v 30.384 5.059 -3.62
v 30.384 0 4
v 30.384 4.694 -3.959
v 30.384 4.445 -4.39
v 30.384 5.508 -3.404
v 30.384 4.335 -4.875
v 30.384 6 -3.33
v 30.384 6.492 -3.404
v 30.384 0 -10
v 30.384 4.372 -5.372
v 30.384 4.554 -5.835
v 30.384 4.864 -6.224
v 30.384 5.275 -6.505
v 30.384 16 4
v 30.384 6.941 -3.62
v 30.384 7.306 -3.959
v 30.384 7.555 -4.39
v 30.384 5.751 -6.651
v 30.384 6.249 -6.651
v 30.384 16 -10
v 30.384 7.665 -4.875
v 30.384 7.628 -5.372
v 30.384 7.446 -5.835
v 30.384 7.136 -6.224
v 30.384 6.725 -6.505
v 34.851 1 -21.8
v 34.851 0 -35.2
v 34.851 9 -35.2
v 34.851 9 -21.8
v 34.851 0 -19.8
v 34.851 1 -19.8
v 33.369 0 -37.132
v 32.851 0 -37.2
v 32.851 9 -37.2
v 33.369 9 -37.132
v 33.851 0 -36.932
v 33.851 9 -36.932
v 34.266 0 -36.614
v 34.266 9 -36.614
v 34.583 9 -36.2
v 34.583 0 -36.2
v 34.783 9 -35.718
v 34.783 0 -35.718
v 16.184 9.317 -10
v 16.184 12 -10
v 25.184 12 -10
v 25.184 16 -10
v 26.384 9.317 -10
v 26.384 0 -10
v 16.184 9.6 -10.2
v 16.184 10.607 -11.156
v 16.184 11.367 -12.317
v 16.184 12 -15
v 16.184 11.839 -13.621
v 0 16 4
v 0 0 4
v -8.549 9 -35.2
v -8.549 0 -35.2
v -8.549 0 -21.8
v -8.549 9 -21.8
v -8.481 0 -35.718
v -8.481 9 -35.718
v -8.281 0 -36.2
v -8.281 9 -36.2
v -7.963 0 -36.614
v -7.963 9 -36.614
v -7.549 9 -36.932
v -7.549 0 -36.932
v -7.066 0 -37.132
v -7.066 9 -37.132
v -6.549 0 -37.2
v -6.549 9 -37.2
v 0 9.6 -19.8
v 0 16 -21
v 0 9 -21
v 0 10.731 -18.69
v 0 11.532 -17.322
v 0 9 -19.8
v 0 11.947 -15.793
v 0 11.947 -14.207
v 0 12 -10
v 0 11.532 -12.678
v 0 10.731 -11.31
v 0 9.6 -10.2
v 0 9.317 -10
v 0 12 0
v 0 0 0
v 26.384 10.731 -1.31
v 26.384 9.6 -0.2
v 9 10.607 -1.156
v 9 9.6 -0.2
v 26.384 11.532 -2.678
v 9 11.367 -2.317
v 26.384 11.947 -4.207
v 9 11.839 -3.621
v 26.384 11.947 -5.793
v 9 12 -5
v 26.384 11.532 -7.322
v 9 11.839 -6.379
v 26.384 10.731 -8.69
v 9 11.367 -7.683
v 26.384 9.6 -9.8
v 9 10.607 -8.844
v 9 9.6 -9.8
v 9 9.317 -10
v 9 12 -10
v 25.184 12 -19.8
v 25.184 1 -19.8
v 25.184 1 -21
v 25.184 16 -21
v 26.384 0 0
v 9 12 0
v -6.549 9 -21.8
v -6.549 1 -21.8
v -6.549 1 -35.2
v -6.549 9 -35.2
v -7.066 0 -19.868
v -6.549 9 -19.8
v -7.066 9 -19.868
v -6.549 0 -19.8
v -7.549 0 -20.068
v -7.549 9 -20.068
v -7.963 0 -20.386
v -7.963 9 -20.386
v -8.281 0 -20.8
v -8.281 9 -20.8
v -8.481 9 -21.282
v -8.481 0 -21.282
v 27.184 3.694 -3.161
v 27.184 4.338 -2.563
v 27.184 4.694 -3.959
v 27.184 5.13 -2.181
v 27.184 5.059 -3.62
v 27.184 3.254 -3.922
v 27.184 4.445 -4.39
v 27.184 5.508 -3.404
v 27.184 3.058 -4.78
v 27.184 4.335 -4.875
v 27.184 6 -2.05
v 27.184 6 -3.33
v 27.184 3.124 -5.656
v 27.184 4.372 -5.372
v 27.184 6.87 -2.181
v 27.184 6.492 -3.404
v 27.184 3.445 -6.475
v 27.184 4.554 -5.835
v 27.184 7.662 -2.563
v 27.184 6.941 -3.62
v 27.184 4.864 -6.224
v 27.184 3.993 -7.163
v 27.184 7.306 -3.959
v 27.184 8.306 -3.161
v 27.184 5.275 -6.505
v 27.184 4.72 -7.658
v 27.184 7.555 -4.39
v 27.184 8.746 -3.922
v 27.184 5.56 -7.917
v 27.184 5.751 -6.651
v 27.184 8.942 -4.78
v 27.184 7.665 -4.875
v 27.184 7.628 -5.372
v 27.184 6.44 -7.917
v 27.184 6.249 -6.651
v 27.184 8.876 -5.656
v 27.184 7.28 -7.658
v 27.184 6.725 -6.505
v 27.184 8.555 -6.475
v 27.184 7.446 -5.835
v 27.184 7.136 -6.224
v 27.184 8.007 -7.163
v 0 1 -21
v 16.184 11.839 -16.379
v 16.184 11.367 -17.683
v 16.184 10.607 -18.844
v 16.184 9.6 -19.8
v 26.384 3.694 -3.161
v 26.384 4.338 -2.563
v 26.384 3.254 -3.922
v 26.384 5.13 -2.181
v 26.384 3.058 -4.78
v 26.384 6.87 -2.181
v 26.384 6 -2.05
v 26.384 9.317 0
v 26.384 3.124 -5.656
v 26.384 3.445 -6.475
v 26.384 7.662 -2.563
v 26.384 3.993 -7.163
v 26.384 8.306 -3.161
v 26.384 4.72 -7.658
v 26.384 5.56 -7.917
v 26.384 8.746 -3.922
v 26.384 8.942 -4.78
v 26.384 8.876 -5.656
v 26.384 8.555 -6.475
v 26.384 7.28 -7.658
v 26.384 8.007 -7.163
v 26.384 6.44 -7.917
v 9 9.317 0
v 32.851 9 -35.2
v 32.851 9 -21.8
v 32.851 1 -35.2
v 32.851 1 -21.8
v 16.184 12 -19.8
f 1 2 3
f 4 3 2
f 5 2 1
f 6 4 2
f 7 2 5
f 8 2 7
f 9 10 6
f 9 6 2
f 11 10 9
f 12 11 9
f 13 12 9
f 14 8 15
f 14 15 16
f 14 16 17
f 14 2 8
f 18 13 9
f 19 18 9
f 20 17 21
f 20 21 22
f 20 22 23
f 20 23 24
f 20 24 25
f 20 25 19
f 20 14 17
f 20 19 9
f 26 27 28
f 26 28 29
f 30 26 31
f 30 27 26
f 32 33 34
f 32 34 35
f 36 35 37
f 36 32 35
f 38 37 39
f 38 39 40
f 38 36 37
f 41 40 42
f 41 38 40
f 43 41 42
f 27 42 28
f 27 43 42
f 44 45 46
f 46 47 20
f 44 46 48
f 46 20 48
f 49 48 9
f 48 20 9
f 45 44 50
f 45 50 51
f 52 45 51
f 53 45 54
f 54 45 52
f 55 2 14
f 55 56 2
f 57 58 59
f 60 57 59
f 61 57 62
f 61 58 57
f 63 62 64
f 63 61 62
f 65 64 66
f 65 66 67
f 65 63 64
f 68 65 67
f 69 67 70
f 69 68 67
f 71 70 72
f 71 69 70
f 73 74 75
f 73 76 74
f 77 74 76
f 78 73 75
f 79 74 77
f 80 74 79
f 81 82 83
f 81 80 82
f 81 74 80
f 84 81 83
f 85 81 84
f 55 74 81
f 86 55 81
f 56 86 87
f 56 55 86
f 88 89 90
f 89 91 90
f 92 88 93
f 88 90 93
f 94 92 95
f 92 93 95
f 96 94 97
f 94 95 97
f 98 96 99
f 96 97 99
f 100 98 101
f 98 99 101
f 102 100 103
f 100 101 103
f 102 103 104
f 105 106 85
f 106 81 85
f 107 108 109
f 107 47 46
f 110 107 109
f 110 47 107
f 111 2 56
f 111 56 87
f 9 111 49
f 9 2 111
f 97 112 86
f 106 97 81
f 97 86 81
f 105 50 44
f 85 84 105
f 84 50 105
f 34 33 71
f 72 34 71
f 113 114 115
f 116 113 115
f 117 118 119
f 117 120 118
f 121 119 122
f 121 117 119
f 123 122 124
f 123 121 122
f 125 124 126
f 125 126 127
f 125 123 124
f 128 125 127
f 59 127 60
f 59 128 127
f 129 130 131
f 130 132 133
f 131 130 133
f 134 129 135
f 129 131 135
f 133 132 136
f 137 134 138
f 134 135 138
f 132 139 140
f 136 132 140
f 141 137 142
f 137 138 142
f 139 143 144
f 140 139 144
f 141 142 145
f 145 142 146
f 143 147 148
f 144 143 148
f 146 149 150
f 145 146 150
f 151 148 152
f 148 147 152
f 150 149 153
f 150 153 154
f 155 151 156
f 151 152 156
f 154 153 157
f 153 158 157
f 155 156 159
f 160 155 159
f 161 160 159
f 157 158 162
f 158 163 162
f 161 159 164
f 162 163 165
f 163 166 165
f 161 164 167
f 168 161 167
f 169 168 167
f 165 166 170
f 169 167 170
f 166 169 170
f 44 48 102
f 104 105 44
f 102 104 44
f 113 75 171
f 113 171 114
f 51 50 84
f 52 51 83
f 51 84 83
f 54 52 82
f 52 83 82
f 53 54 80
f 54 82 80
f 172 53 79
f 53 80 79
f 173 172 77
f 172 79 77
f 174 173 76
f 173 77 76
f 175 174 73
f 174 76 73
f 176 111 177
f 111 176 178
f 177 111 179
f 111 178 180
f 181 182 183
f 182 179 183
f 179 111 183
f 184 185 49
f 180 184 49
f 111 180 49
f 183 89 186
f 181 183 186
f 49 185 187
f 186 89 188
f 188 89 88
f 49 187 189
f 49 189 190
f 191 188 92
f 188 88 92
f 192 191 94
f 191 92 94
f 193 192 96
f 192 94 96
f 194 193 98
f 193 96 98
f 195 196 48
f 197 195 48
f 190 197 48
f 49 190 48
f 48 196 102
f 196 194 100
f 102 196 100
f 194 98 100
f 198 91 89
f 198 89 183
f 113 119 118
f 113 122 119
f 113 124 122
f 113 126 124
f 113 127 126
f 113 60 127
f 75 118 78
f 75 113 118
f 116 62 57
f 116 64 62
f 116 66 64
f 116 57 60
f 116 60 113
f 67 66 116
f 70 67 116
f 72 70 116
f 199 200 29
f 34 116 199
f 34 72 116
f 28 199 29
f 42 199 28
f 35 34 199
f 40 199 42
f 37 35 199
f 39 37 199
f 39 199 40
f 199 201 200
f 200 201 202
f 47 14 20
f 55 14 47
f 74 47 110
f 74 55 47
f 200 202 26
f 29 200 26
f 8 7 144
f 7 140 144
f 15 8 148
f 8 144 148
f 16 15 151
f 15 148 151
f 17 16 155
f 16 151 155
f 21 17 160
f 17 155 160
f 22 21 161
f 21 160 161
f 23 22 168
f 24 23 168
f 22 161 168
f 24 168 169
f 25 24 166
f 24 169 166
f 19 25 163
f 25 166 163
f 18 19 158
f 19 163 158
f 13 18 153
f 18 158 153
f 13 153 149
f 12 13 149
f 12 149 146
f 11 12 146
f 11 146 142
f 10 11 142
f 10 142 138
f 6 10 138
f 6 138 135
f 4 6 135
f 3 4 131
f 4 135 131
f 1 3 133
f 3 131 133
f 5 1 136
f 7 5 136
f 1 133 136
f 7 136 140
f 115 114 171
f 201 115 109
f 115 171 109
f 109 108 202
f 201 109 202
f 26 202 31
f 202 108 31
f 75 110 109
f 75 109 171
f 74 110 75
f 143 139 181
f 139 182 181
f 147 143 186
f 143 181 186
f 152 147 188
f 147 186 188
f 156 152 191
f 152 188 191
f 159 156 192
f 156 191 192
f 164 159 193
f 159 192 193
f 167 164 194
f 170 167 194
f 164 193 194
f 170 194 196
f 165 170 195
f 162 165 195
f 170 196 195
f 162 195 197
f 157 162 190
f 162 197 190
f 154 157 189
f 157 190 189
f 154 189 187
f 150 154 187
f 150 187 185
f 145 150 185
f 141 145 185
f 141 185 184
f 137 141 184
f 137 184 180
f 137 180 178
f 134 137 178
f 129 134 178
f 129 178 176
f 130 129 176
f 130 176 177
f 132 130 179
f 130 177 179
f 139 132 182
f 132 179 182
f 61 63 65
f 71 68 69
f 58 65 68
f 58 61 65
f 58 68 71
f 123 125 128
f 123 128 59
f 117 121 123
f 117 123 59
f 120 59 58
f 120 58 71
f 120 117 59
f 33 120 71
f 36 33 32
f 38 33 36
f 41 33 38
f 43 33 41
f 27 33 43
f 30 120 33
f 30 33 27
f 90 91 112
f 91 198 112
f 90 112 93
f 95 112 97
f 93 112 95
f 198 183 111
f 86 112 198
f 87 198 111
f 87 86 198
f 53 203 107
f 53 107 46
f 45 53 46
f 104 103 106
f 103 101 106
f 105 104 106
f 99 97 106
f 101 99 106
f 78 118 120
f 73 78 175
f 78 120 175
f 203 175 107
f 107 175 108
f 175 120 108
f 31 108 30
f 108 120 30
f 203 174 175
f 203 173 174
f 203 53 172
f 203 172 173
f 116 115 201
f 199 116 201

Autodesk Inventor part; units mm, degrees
sketch "Szkic1" plane through (0, 0, 0) normal (1, 0, 0) x (0, 1, 0)
  line L0 (0, 0) -> (12, 0)
  line L1 (12, 0) -> (12, -10)
  line L2 (16, -10) -> (16, 4)
  line L3 (16, 4) -> (0, 4)
  line L4 (0, 4) -> (0, 0)
  line L5 (12, -10) -> (16, -10)
  dimension "d0" = 12
  dimension "d1" = 10
  dimension "d2" = 4
extrude "Wyciągnięcie proste1" add sketch "Szkic1" along normal blind 9
sketch "Szkic2" plane through (0, 0, 0) normal (-1, 0, 0) x (0, 0, 1)
  arc A0 (-10.2, 9.6) -> (-19.8, 9.6) centre (-15, 6) ccw projected
  line L0 (-10, 12) -> (-10, 16) projected
  line L1 (-10, 12) -> (-10.2, 12)
  line L2 (-10.2, 12) -> (-10.2, 9.6)
  line L3 (-10, 11) -> (-10, 1) projected
  line L4 (-10, 11) -> (-10, 12)
  line L5 (-10.2, 9.6) -> (-10, 9.3166)
  line L6 (-19.8, 9.6) -> (-19.8, 16)
  line L7 (-10, 16) -> (4, 16) projected
  line L8 (-19.8, 16) -> (-10, 16)
  point P0 (0, 0)
extrude "Wyciągnięcie proste2" add sketch "Szkic2" against normal up to surface (9 mm away)
sketch "Szkic3" plane through (9, 0, 0) normal (1, 0, 0) x (0, 0, -1)
  line L0 (0, 12) -> (10, 12) projected
  line L1 (10, 9.3166) -> (10, 12) projected
  line L2 (10.2, 9.6) -> (10, 9.3166) projected
  arc A0 (19.8, 9.6) -> (10.2, 9.6) centre (15, 6) ccw projected
  line L3 (19.8, 16) -> (19.8, 9.6) projected
  line L4 (-4, 16) -> (19.8, 16) projected
  line L5 (-4, 16) -> (-4, 0) projected
  line L6 (-4, 0) -> (0, 0) projected
  line L7 (0, 0) -> (0, 12) projected
  arc A1 (9.8, 9.6) -> (0.2, 9.6) centre (5, 6) ccw projected
  line L8 (9.8, 9.6) -> (10, 9.3166)
  line L9 (0.2, 9.6) -> (0, 9.3166)
ref_plane "Płaszczyzna konstrukcyjna1" through (16.1843, 0, -20) normal (-1, 0, 0) x (0, 0, 1)
extrude "Wyciągnięcie proste3" add sketch "Szkic3" along normal up to surface (7.1843 mm away)
sketch "Szkic4" plane through (16.1843, 0, 4) normal (1, 0, 0) x (0, 0, -1)
  line L0 (23, 12) -> (15, 12) projected
  arc A0 (13.8, 9.6) -> (4.2, 9.6) centre (9, 6) ccw projected
  line L1 (13.8, 9.6) -> (14, 9.3166) projected
  line L2 (14, 9.3166) -> (14.2, 9.6) projected
  arc A1 (23.8, 9.6) -> (14.2, 9.6) centre (19, 6) ccw projected
  line L3 (23.8, 9.6) -> (23.8, 16) projected
  line L4 (23.8, 16) -> (0, 16) projected
  line L5 (0, 16) -> (0, 0) projected
  line L6 (0, 0) -> (4, 0) projected
  line L7 (4, 0) -> (4, 9.3166) projected
  line L8 (4, 9.3166) -> (4.2, 9.6) projected
  line L9 (23, 12) -> (23.8, 12)
  line L10 (23.8, 9.6) -> (23.8, 16) projected
  line L11 (14, 11) -> (14, 1) projected
  line L12 (15, 12) -> (14, 12)
  line L13 (14, 12) -> (14, 11)
  point P0 (4, 0)
ref_plane "Płaszczyzna konstrukcyjna2" through (25.1843, 0, -20) normal (1, 0, 0) x (0, 1, 0)
extrude "Wyciągnięcie proste4" add sketch "Szkic4" along normal up to surface (9 mm away) contours L0 L12 L13 L11 L1 A0 L8 L7 L6 L5 L4 L3 L9
sketch "Szkic5" plane through (0, 9.6, -19.8) normal (0, 0, -1) x (-1, 0, 0)
  line L0 (0, 0) -> (-16.1843, 0) projected
  line L1 (0, 6.4) -> (0, 0) projected
  line L2 (0, 6.4) -> (-25.1843, 6.4) projected
  line L3 (-25.1843, 6.4) -> (-25.1843, 2.4) projected
  line L4 (-16.1843, 2.4) -> (-25.1843, 2.4) projected
  line L5 (-16.1843, 0) -> (-16.1843, 2.4) projected
  line L6 (0, -9.6) -> (-25.1843, -9.6) projected
  line L7 (0, 6.4) -> (-25.1843, 6.4) projected
  line L8 (-25.1843, 6.4) -> (0, 6.4)
  line L9 (0, 6.4) -> (0, -9.6)
  line L10 (0, -9.6) -> (-25.1843, -9.6)
  line L11 (-25.1843, -9.6) -> (-25.1843, 6.4)
ref_plane "Płaszczyzna konstrukcyjna3" through (-5.8487, 1.5, -21) normal (0, 0, 1) x (1, 0, 0)
extrude "Wyciągnięcie proste5" add sketch "Szkic5" along normal up to surface (1.2 mm away)
sketch "Szkic6" plane through (0, 0, -19.8) normal (0, -1, 0) x (1, 0, 0)
  line L0 (32.6513, -1.7) -> (32.6513, -14.7) projected
  line L1 (32.1513, -15.2) -> (-5.8487, -15.2) projected
  line L2 (-5.8487, -1.2) -> (32.1513, -1.2) projected
  line L3 (-6.3487, -14.7) -> (-6.3487, -1.7) projected
  line L4 (32.6513, -1.2) -> (-6.3487, -1.2)
  line L5 (-6.3487, -1.2) -> (-6.3487, -15.2)
  line L6 (-6.3487, -15.2) -> (32.6513, -15.2)
  line L7 (32.6513, -15.2) -> (32.6513, -1.2)
  line L8 (-6.5487, -1) -> (32.8513, -1)
  line L9 (32.8513, -1) -> (32.8513, -15.4)
  line L10 (32.8513, -15.4) -> (-6.5487, -15.4)
  line L11 (-6.5487, -15.4) -> (-6.5487, -1)
  line L12 (34.8513, 1) -> (-8.5487, 1)
  line L13 (-8.5487, 1) -> (-8.5487, -17.4)
  line L14 (-8.5487, -17.4) -> (34.8513, -17.4)
  line L15 (34.8513, -17.4) -> (34.8513, 1)
  line L16 (16.1843, 0) -> (25.1843, 0) projected
  line L17 (25.1843, 0) -> (25.1843, -1.2) projected
  line L18 (25.1843, 0) -> (34.8513, 0)
  line L19 (32.8513, -1) -> (32.8513, 1)
  line L20 (25.1843, 0) -> (0, 0) projected
  line L21 (0, 0) -> (-8.5487, 0)
  line L22 (-6.5487, -1) -> (-6.5487, 1)
  point P0 (0, 19.8)
  dimension "d13" = 0.2
  dimension "d14" = 2
extrude "Wyciągnięcie proste6" add sketch "Szkic6" against normal blind 1 contours L8 L9 L10 L11 | L8 L22 L21 L20 L16 L17 | L17 L18 L19 L8 | L0 L7 L6 L1 L5 L3 L4 L2 | L11 L10 L9 L19 L18 L15 L14 L13 L21 L22
sketch "Szkic7" plane through (0, 1, -19.8) normal (0, 1, 0) x (1, 0, 0)
  line L0 (0, 1.2) -> (0, 0) projected
  line L1 (25.1843, 1.2) -> (0, 1.2) projected
  line L2 (25.1843, 0) -> (25.1843, 1.2) projected
  line L3 (25.1843, 0) -> (34.8513, 0) projected
  line L4 (34.8513, 0) -> (34.8513, 17.4) projected
  line L5 (34.8513, 17.4) -> (-8.5487, 17.4) projected
  line L6 (-8.5487, 17.4) -> (-8.5487, 0) projected
  line L7 (-8.5487, 0) -> (0, 0) projected
  line L8 (32.8513, 15.4) -> (32.8513, 2)
  line L9 (-2, 2) -> (-6.5487, 2)
  line L10 (-6.5487, 2) -> (-6.5487, 15.4)
  line L11 (-6.5487, 15.4) -> (32.8513, 15.4)
  line L12 (0, 1.2) -> (-6.5487, 2)
  line L13 (32.8513, 2) -> (34.8513, 2)
  line L14 (34.8513, 0) -> (34.8513, 17.4) projected
  point P0 (0, -19.8)
  point P1 (34.8513, 2)
  dimension "d17" = 2
extrude "Wyciągnięcie proste7" add sketch "Szkic7" along normal blind 8 contours L0 L7 L6 L5 L4 L13 L8 L11 L10 L12
fillet "Zaokrąglenie1" radius 2 3 edges at (34.8513, 4.5, -37.2) (-8.5487, 4.5, -37.2) (-8.5487, 4.5, -19.8)
sketch "Szkic8" plane through (25.1843, 0, 4) normal (1, 0, 0) x (0, 0, -1)
  line L0 (23.8, 1) -> (25, 1) projected
  line L1 (25, 16) -> (25, 1) projected
  line L2 (0, 16) -> (25, 16) projected
  line L3 (0, 0) -> (0, 16) projected
  line L4 (4, 0) -> (0, 0) projected
  line L5 (4, 9.3166) -> (4, 0) projected
  line L6 (4.2, 9.6) -> (4, 9.3166) projected
  arc A0 (13.8, 9.6) -> (4.2, 9.6) centre (9, 6) ccw projected
  line L7 (14, 9.3166) -> (13.8, 9.6) projected
  line L8 (14, 12) -> (14, 9.3166) projected
  line L9 (23.8, 12) -> (14, 12) projected
  line L10 (23.8, 12) -> (23.8, 1) projected
  line L11 (23.8, 12) -> (14, 12) projected
  line L12 (14, 12) -> (14, 16)
  line L13 (0, 16) -> (25, 16) projected
  point P0 (4, 0)
  point P1 (14, 16)
ref_plane "Płaszczyzna konstrukcyjna4" through (27.1843, 3.25, -7.75) normal (1, 0, 0) x (0, 1, 0)
extrude "Wyciągnięcie proste8" add sketch "Szkic8" along normal up to surface (2 mm away) contours L8 L7 A0 L6 L5 L4 L3 L2 L12
sketch "Szkic9" plane through (27.1843, 0, 4) normal (1, 0, 0) x (0, 0, -1)
  circle A0 centre (9, 6) radius 2.75 projected
  arc A1 (13.8, 9.6) -> (4.2, 9.6) centre (9, 6) ccw projected
  line L0 (14, 9.3166) -> (14, 0)
  line L1 (4, 9.3166) -> (4, 0) projected
  line L2 (4.2, 9.6) -> (4, 9.3166) projected
  line L3 (4, 0) -> (14, 0)
  line L4 (14, 9.3166) -> (13.8, 9.6) projected
extrude "Wyciągnięcie proste9" add sketch "Szkic9" against normal blind 0.8
sketch "Szkic10" plane through (27.1843, 0, 4) normal (1, 0, 0) x (0, 0, -1)
  circle A0 centre (9, 6) radius 1.47 projected
  circle A1 centre (9, 6) radius 2.75 projected
  line L0 (0, 0) -> (0, 16) projected
  line L1 (0, 0) -> (14, 0) projected
  line L2 (14, 16) -> (14, 0) projected
  line L3 (0, 16) -> (14, 16) projected
  point P0 (4, 0)
extrude "Wyciągnięcie proste10" add sketch "Szkic10" along normal blind 3.2 contours A1 | L0 L3 L2 L1
sketch "Szkic11" plane through (26.3843, 0, 4) normal (-1, 0, 0) x (0, 0, 1)
  circle A0 centre (-9, 6) radius 2.75 projected
  circle A1 centre (-9, 6) radius 2.95
  point P0 (-4, 0)
  dimension "d27" = 0.2
extrude "Wyciągnięcie proste11" cut sketch "Szkic11" against normal up to surface (0.8 mm away) contours A0 | A1
sketch "Szkic12" plane through (27.1843, 6, -5) normal (-1, 0, 0) x (0, 0, 1)
  circle A0 centre (0, 0) radius 1.47 projected
  circle A1 centre (0, 0) radius 1.67
  point P0 (5, -6)
  dimension "d30" = 0.2
extrude "Wyciągnięcie proste12" cut sketch "Szkic12" against normal through all contours A0 | A1
properties part number "montaz_silniki"
